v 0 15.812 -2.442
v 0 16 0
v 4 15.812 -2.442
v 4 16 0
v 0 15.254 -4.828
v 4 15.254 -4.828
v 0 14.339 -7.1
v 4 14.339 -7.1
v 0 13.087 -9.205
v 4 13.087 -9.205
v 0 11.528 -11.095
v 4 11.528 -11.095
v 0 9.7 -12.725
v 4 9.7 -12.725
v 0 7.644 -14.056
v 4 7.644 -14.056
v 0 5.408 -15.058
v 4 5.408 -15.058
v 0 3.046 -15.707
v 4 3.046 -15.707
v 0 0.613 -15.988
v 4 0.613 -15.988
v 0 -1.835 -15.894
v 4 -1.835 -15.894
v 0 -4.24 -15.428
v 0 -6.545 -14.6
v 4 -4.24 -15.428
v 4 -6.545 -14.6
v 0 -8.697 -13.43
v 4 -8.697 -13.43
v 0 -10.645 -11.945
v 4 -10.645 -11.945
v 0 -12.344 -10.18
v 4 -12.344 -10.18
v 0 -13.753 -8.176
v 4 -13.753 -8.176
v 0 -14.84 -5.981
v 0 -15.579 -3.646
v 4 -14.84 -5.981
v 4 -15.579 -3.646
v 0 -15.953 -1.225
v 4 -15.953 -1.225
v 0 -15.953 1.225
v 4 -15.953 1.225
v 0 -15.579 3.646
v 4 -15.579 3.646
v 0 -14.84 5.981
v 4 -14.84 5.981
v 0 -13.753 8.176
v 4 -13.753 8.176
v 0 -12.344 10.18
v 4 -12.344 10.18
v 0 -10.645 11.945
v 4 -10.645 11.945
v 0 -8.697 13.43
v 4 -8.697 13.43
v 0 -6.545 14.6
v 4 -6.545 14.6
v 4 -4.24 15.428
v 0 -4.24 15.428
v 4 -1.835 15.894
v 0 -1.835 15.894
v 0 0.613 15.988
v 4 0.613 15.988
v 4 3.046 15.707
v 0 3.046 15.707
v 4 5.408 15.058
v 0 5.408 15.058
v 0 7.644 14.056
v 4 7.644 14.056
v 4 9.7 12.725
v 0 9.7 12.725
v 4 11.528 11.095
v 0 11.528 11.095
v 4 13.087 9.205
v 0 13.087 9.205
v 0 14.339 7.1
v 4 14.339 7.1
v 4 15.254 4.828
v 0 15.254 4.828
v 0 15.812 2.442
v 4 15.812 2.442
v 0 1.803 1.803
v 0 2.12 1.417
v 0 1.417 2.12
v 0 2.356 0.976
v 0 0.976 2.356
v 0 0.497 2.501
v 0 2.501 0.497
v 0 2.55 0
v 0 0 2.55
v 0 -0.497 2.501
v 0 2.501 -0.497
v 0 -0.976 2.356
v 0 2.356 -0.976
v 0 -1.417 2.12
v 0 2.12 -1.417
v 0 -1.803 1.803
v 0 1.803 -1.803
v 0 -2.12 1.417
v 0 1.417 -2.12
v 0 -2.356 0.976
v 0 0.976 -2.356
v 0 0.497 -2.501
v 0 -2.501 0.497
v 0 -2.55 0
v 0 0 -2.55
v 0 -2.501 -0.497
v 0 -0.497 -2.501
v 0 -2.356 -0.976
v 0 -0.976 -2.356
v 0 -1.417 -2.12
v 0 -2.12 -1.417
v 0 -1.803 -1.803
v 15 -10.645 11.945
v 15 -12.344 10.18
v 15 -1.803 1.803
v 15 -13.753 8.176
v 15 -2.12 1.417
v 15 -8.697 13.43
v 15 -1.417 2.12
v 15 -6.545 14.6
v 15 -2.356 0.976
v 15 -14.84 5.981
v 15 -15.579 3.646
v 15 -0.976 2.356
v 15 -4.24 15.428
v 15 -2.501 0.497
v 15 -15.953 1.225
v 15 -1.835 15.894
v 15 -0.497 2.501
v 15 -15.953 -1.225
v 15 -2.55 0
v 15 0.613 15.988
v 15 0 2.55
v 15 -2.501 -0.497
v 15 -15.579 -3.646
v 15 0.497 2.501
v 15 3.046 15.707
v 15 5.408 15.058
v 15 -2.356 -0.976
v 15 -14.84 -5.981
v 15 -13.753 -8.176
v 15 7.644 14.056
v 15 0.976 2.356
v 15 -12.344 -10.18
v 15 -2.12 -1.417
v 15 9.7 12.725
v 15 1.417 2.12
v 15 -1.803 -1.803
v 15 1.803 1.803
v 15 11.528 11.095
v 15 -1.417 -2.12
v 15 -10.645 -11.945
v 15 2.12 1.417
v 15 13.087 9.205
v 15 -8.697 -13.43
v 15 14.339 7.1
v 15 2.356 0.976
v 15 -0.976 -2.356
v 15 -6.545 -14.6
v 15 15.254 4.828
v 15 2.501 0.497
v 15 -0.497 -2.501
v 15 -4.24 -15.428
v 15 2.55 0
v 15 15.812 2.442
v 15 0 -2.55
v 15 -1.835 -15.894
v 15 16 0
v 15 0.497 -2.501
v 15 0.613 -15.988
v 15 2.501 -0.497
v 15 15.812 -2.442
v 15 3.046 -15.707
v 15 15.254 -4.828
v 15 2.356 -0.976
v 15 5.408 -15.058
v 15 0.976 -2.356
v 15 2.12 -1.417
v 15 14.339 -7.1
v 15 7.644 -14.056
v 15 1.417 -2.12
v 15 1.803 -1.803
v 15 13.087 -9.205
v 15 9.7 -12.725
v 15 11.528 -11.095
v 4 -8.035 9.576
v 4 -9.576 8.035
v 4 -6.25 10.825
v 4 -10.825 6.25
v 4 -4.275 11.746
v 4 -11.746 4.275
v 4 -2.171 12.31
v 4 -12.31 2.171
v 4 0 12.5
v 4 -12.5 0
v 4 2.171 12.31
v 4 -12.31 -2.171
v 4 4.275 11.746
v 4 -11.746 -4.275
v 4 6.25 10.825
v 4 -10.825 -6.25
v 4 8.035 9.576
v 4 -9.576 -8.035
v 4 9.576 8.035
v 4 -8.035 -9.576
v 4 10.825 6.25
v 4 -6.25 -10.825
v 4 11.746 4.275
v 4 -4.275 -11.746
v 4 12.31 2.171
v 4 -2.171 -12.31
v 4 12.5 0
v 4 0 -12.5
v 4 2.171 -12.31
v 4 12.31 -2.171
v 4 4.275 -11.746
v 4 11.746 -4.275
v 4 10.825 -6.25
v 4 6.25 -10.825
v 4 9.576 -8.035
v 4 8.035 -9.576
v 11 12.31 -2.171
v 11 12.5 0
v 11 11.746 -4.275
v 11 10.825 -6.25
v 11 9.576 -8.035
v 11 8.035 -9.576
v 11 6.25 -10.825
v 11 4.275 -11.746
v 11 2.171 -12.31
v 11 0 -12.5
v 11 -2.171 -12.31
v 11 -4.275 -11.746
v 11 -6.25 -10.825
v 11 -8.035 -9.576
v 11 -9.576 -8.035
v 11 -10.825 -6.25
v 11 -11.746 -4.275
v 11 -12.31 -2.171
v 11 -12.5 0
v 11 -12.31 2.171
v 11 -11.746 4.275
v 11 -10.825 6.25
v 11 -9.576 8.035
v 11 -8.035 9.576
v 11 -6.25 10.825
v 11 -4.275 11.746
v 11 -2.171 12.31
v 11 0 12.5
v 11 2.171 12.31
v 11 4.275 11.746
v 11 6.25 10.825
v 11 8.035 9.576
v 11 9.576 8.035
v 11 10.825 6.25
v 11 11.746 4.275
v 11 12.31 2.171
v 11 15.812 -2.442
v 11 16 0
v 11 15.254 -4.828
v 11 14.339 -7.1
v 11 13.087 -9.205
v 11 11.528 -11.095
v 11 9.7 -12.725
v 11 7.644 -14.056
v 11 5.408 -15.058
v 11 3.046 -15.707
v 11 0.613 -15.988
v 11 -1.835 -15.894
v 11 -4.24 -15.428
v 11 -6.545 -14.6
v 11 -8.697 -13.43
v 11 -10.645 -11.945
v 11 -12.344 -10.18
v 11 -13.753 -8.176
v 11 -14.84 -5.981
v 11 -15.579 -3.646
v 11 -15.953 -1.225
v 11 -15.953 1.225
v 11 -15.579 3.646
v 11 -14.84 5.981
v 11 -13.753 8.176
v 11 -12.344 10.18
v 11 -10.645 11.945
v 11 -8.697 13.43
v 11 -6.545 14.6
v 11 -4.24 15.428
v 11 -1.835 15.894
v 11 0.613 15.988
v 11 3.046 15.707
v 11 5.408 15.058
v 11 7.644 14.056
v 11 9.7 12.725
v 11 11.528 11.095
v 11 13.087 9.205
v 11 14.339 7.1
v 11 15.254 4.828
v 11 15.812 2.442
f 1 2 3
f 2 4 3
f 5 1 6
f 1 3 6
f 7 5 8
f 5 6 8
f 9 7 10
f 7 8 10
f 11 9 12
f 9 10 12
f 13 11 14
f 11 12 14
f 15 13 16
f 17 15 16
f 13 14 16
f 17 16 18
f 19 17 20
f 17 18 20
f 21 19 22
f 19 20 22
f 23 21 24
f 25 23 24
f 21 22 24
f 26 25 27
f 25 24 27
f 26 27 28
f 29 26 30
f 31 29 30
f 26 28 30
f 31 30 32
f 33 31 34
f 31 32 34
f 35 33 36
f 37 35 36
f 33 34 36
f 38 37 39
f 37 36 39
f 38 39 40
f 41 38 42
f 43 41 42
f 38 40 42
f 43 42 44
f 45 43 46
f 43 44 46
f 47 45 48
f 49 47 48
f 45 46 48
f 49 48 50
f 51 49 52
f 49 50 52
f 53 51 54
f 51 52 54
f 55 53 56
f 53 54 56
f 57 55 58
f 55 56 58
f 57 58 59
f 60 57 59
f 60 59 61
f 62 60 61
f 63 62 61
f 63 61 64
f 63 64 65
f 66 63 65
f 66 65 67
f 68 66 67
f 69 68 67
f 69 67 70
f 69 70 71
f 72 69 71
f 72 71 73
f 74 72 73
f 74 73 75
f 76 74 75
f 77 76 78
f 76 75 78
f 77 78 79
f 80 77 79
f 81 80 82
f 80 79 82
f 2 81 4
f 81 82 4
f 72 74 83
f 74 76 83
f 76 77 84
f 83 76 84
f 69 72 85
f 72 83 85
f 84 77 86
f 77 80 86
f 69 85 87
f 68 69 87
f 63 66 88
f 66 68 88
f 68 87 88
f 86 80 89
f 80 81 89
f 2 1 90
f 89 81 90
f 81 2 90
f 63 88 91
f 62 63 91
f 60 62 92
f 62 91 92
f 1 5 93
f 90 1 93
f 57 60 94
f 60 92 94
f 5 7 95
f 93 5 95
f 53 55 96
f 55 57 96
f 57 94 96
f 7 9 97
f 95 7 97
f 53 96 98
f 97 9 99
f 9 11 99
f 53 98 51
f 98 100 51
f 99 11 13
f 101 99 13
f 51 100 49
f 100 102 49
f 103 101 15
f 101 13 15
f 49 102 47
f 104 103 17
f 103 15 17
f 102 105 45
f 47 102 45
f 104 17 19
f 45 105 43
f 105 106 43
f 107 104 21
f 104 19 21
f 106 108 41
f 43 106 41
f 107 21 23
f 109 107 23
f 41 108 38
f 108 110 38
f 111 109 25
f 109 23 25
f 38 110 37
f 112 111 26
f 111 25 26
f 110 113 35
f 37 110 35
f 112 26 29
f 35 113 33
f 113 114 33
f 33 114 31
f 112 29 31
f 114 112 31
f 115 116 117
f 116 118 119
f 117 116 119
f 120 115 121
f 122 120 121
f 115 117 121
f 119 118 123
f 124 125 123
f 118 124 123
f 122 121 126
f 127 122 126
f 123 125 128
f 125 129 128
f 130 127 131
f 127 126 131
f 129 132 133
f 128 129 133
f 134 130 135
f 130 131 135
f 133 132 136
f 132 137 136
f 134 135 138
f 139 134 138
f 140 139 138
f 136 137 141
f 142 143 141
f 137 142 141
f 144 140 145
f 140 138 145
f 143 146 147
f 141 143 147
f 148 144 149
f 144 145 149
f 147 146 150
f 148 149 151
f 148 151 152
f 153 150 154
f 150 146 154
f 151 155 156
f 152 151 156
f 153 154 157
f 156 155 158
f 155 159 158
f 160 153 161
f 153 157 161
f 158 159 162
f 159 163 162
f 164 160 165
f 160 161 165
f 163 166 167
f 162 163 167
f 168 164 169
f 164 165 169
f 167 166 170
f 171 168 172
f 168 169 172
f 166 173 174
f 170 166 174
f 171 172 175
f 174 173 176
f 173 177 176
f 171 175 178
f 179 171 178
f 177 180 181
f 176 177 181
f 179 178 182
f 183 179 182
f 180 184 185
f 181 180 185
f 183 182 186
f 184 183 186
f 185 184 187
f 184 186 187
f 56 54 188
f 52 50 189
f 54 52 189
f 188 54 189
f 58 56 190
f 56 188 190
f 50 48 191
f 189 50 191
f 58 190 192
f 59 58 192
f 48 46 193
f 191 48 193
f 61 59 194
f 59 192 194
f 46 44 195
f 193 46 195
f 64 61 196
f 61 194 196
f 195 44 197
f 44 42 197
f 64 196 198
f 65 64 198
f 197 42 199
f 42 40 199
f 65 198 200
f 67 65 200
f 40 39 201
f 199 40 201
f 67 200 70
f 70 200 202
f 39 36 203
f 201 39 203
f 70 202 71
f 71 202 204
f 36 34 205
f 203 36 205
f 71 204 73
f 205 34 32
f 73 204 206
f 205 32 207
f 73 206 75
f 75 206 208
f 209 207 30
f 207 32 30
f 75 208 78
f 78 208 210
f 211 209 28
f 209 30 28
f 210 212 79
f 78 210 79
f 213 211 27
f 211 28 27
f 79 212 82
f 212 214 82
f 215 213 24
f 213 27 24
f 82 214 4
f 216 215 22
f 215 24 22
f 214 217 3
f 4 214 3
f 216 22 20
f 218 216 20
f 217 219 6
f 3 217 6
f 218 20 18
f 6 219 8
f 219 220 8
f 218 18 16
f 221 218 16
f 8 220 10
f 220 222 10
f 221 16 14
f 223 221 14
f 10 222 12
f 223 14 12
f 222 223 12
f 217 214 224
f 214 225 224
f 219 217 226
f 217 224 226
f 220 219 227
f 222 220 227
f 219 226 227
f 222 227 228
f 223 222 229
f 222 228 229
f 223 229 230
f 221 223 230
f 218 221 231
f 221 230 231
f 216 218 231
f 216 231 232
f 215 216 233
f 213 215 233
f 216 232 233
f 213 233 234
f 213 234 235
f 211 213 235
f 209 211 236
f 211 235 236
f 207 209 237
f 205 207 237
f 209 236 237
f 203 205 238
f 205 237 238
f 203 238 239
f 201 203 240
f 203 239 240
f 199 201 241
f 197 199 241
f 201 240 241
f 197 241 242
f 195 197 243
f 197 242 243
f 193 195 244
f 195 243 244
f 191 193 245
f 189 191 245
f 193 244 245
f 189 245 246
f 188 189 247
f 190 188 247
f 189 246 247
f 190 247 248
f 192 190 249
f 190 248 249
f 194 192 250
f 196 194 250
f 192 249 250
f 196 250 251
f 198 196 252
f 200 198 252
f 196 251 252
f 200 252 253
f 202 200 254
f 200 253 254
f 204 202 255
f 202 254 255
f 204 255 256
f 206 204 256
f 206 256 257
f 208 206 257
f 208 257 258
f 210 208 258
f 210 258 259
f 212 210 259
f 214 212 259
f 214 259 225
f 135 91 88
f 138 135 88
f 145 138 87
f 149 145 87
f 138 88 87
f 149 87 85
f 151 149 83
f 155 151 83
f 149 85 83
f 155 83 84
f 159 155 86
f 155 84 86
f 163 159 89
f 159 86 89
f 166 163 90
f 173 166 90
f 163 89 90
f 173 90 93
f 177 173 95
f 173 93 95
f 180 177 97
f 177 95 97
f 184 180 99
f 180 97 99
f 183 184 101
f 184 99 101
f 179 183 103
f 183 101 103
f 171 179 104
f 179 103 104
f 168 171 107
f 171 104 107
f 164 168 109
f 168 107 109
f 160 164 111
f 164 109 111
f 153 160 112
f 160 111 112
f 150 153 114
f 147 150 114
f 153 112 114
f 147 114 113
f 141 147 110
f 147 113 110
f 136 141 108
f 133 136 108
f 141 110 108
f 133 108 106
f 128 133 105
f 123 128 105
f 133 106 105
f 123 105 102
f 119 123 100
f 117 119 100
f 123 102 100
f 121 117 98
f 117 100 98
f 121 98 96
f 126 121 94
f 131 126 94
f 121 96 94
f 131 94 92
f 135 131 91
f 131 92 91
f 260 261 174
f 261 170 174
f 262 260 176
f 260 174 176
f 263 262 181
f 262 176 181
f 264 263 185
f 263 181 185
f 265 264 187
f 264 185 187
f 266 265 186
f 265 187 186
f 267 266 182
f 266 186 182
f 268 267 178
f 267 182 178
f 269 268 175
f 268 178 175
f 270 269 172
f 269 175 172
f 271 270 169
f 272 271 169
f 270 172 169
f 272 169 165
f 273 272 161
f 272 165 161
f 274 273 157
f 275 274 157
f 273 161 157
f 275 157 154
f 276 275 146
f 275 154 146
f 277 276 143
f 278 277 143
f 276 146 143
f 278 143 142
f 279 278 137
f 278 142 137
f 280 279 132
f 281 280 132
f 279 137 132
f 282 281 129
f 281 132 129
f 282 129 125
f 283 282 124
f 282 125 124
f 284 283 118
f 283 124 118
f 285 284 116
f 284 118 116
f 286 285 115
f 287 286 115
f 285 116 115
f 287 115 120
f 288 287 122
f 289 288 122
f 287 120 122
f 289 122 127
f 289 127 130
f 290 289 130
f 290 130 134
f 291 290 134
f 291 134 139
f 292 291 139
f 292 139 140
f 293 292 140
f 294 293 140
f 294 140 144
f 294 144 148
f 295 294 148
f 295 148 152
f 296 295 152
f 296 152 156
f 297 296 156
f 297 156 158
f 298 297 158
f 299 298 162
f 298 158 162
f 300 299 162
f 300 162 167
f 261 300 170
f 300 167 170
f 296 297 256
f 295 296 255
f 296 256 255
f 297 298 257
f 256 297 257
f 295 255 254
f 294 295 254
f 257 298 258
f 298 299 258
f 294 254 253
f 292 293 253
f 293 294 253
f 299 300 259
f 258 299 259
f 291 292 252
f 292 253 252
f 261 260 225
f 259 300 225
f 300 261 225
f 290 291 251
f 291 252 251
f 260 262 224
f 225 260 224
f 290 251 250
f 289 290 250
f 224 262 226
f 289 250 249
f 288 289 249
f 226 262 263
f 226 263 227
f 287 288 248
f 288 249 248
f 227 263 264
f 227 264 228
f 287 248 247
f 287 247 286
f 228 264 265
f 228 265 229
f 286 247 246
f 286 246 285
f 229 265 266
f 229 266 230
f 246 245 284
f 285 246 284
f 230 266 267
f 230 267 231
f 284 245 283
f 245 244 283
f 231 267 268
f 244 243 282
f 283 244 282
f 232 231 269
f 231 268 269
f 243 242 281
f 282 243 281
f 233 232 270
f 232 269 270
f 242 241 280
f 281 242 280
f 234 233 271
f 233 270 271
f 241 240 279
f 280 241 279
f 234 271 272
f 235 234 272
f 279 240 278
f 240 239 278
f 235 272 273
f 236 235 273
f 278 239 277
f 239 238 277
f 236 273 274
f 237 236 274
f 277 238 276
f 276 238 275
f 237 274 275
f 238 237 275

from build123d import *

# Parameters (mm, degrees)
SKETCH2_R          = 2.55
CUT_EXTRUDE1_DEPTH = 15


with BuildPart() as part:
    # Sketch1 → Revolve1 (revolve)
    with BuildSketch(Plane.XY):
        Polygon((0, 0), (0, 16), (4, 16), (4, 12.5), (11, 12.5), (11, 16), (15, 16), (15, 0), align=None)
    revolve(axis=Axis((15, 0, 0), (-1, 0, 0)))

    # Sketch2 → Cut-Extrude1 (cut)
    with BuildSketch(Plane.ZY):
        Circle(SKETCH2_R)
    extrude(amount=-CUT_EXTRUDE1_DEPTH, mode=Mode.SUBTRACT)


solid = part.part
